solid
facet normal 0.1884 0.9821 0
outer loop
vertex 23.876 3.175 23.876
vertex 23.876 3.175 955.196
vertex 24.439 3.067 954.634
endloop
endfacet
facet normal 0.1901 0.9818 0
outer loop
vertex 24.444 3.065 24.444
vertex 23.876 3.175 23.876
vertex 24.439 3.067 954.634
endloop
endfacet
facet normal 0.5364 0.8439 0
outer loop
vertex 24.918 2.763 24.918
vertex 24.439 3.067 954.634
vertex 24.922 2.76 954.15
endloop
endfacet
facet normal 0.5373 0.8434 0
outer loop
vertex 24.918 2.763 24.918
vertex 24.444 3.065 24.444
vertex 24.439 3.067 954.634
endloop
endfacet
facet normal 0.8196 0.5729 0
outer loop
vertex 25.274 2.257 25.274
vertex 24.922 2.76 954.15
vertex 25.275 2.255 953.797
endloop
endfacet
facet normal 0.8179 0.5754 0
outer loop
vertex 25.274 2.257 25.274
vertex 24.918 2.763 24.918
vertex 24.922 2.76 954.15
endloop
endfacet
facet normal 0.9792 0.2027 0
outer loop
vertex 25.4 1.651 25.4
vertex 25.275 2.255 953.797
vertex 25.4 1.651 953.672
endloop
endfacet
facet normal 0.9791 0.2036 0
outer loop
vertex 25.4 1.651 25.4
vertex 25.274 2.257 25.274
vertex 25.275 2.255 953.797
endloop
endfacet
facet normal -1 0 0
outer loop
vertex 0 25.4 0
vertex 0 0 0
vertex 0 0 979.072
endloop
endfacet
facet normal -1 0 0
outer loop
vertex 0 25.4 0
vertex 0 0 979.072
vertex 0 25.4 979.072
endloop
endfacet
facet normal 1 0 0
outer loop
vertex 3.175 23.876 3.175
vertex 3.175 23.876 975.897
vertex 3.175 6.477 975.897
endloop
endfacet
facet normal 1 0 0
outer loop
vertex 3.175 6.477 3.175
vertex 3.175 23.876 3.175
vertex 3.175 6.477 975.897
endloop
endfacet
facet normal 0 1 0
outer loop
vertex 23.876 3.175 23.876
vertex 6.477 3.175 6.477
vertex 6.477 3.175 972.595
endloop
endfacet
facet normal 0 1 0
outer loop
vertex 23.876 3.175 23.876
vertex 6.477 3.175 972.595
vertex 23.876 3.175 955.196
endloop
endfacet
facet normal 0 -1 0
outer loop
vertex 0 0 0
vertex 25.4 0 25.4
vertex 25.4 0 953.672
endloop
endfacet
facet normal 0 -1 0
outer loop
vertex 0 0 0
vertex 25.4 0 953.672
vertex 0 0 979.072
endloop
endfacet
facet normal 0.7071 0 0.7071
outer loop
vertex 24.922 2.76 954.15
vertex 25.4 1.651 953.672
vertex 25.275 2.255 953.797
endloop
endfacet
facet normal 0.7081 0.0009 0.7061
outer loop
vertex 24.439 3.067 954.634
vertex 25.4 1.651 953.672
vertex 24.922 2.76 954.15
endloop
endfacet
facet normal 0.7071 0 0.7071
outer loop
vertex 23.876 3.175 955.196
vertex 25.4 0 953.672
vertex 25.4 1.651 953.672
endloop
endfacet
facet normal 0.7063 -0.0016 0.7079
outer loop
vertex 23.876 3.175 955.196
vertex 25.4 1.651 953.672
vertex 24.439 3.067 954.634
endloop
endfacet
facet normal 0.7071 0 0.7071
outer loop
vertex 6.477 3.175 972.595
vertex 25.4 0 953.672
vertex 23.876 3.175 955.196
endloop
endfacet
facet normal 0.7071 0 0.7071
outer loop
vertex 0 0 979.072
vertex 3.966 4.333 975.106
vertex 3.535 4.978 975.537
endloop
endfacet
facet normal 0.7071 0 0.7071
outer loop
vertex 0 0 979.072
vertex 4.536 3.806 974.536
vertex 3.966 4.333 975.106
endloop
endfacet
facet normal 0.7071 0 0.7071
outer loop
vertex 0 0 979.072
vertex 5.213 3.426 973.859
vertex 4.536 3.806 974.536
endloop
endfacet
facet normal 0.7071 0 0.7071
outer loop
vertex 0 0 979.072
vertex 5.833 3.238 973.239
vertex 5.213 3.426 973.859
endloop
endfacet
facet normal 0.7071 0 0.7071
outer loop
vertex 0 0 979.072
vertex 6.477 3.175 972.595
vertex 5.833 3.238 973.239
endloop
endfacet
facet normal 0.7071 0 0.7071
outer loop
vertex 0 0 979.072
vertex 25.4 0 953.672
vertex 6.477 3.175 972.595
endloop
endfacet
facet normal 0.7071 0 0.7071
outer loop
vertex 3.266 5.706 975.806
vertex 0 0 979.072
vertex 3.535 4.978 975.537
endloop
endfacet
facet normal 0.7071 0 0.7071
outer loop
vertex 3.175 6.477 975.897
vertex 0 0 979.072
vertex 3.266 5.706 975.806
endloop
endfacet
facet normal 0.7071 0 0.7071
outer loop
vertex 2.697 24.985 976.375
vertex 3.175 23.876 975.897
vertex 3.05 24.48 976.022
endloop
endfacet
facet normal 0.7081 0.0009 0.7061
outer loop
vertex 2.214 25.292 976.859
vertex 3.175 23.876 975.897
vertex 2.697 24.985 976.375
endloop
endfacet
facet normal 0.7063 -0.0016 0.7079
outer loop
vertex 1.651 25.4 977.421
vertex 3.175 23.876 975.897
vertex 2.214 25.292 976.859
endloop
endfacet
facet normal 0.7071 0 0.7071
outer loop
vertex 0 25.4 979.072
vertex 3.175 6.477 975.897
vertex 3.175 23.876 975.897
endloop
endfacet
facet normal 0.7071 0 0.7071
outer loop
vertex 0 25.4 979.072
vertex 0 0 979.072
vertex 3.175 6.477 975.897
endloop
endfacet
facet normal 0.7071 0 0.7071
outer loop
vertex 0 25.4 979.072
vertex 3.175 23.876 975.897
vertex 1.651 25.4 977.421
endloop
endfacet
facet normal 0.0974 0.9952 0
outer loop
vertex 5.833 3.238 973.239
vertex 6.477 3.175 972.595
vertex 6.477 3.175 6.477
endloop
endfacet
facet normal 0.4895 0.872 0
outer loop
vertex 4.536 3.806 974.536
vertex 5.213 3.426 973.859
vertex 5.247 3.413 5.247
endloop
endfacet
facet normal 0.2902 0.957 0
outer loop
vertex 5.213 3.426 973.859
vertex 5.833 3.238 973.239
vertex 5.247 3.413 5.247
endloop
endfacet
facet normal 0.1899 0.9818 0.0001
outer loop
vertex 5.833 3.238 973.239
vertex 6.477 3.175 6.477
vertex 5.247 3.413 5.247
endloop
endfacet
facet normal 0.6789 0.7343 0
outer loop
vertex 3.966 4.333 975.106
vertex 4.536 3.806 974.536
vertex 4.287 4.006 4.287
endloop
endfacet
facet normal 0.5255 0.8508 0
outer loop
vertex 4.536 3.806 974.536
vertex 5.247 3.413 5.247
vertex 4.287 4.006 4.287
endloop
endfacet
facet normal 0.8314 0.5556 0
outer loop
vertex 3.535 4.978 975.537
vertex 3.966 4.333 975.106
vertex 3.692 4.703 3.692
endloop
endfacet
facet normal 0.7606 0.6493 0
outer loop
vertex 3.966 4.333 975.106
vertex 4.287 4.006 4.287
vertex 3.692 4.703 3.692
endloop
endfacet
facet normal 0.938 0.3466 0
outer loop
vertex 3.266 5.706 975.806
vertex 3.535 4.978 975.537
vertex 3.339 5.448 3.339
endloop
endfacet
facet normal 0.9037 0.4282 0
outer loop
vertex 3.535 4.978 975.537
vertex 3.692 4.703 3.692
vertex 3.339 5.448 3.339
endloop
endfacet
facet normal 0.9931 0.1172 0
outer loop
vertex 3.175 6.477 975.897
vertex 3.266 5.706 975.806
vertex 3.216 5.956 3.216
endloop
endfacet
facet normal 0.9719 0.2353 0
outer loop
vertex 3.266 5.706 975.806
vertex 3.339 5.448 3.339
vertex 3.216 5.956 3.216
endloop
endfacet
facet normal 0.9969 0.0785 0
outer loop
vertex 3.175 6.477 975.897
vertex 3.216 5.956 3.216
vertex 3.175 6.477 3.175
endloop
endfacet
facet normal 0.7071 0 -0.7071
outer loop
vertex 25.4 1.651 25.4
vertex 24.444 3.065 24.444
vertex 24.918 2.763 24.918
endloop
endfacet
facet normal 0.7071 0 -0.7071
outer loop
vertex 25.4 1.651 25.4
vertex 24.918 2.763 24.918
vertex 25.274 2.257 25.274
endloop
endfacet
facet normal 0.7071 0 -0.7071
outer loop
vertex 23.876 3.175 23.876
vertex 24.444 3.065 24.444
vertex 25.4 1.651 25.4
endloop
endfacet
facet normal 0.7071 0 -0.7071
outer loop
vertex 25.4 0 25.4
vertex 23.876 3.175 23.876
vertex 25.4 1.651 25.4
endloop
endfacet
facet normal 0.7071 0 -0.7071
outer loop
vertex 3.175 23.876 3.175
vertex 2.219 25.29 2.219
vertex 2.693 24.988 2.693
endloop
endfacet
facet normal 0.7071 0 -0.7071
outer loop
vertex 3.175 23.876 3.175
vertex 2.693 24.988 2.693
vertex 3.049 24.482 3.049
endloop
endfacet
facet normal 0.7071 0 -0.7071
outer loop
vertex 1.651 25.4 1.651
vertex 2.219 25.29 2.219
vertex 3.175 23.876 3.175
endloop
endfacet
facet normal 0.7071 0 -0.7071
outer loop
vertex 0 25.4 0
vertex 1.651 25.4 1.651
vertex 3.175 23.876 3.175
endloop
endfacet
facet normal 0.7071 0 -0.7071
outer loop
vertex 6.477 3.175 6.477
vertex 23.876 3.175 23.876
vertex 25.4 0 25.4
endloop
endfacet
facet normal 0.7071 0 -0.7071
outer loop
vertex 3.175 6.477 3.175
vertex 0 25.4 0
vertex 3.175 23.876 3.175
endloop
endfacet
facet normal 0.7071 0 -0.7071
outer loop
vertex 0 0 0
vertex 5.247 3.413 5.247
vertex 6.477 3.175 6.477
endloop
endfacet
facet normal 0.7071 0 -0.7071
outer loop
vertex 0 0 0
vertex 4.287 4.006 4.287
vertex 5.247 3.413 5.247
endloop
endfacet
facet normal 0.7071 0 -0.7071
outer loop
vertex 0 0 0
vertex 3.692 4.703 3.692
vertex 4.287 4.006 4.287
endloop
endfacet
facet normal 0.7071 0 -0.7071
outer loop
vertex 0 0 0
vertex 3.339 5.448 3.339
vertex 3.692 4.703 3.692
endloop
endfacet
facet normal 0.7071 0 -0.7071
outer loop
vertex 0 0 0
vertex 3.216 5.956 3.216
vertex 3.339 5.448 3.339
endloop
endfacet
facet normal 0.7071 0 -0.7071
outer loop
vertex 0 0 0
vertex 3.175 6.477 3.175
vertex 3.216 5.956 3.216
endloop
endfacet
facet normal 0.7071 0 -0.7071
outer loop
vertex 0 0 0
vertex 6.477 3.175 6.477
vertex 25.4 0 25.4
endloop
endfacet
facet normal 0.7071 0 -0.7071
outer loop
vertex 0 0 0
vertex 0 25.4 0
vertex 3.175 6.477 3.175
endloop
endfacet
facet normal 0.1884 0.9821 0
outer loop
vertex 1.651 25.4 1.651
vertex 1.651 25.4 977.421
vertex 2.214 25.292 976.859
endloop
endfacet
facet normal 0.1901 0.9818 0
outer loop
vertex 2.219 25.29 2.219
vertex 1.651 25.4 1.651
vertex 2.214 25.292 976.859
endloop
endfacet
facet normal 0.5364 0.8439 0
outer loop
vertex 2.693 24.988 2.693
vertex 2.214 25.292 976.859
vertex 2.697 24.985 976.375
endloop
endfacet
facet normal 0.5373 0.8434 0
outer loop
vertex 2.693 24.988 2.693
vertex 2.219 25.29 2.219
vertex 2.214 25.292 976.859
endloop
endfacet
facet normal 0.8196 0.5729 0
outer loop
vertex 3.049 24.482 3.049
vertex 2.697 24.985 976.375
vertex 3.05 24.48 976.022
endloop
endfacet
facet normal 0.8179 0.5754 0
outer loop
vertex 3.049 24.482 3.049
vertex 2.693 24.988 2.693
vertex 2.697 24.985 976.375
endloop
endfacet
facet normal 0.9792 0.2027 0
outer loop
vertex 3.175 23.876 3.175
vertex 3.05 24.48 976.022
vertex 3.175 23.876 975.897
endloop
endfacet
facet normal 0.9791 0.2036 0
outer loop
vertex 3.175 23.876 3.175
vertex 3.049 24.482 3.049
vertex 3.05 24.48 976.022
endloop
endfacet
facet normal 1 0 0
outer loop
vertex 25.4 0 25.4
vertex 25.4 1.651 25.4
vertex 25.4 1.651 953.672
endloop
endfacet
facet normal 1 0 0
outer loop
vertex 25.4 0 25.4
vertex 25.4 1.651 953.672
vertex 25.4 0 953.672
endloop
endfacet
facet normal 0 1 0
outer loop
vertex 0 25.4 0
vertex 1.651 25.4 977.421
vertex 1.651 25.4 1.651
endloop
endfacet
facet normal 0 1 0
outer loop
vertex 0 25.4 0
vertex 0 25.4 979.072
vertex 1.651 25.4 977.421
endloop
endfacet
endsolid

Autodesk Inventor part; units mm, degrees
ref_plane "Start Plane" through (0, 0, 0) normal (0, 0, 1) x (1, 0, 0)
ref_plane "End Plane" through (0, 0, 979.0722) normal (0, 0, 1) x (1, 0, 0)
sketch "Sketch" plane through (0, 0, 0) normal (0, 0, 1) x (1, 0, 0)
  line L0 (25.4, 0) -> (0, 0)
  line L1 (0, 0) -> (0, 25.4)
  line L2 (0, 25.4) -> (1.651, 25.4)
  line L3 (3.175, 23.876) -> (3.175, 6.477)
  line L4 (6.477, 3.175) -> (23.876, 3.175)
  line L5 (25.4, 1.651) -> (25.4, 0)
  line L6 (0, -11.0414) -> (0, 31.5385) construction
  line L7 (-11.0414, 0) -> (31.5385, 0) construction
  arc A0 (3.175, 6.477) -> (6.477, 3.175) centre (6.477, 6.477) ccw
  arc A1 (3.175, 23.876) -> (1.651, 25.4) centre (1.651, 23.876) ccw
  arc A2 (25.4, 1.651) -> (23.876, 3.175) centre (23.876, 1.651) ccw
  line L8 (0, 40.0545) -> (0, -19.5574) construction
  line L9 (-19.5574, 0) -> (40.0545, 0) construction
  point P0 (3.175, 25.4)
  point P1 (3.175, 3.175)
  point P2 (25.4, 3.175)
  dimension "d0" = 25.4
  dimension "d1" = 25.4
  dimension "d2" = 3.175
  dimension "d3" = 3.175
  dimension "d10" = 0
  dimension "d11" = 0
  dimension "d14" = 3.302
  dimension "d15" = 1.524
extrude "Body" add sketch "Sketch" along normal up to surface (979.0722 mm away) from surface at 0
sketch "Sketch3" plane through (0, 0, 0) normal (0, 0, 1) x (1, 0, 0)
  line L0 (0, 0) -> (10, 0)
ref_plane "Work Plane3" through (0, 0, 0) normal (0, -1, 0) x (1, 0, 0)
ref_plane "Work Plane4" through (0, 12.7, 0) normal (0.7071, 0, -0.7071) x (-0.7071, 0, -0.7071)
split "Split1" plane through (0, 12.7, 0) removes the side toward (0.7071, 0, -0.7071)
ref_plane "Work Plane5" through (0, 12.7, 979.0722) normal (0.7071, 0, 0.7071) x (0.7071, 0, -0.7071)
split "Split2" plane through (0, 12.7, 979.0722) removes the side toward (0.7071, 0, 0.7071)
sketch "Sketch4" plane through (0, 0, 0) normal (0, -1, 0) x (1, 0, 0)
  line L0 (-2, 0) -> (12, 0) projected
  line L1 (-2, 979.0722) -> (12, 979.0722) projected
  dimension "d17" = 979.0722
equation "\"d0\" = G_H"
equation "\"d1\" = G_H"
equation "\"d2\" = G_T"
equation "\"d3\" = G_T"
equation "\"d14\" = G_IR"
equation "\"d15\" = G_ER"
equation "\"d4\" = G_L"
equation "\"G_H\" = 25.4"
equation "\"G_T\" = 3.175"
equation "\"G_ER\" = 1.524"
equation "\"G_IR\" = 3.302"
equation "\"G_L\" = d17"
equation "\"ex\" = 0"
equation "\"G_OFFSET_START\" = 0"
equation "\"G_OFFSET_END\" = 0"
equation "\"d13\" = G_OFFSET_END + B_L"
equation "\"B_L\" = 979.07217"
properties part number "AISC - L 1 x 1 x 1/8 - 38.546" material "Steel, Mild"
